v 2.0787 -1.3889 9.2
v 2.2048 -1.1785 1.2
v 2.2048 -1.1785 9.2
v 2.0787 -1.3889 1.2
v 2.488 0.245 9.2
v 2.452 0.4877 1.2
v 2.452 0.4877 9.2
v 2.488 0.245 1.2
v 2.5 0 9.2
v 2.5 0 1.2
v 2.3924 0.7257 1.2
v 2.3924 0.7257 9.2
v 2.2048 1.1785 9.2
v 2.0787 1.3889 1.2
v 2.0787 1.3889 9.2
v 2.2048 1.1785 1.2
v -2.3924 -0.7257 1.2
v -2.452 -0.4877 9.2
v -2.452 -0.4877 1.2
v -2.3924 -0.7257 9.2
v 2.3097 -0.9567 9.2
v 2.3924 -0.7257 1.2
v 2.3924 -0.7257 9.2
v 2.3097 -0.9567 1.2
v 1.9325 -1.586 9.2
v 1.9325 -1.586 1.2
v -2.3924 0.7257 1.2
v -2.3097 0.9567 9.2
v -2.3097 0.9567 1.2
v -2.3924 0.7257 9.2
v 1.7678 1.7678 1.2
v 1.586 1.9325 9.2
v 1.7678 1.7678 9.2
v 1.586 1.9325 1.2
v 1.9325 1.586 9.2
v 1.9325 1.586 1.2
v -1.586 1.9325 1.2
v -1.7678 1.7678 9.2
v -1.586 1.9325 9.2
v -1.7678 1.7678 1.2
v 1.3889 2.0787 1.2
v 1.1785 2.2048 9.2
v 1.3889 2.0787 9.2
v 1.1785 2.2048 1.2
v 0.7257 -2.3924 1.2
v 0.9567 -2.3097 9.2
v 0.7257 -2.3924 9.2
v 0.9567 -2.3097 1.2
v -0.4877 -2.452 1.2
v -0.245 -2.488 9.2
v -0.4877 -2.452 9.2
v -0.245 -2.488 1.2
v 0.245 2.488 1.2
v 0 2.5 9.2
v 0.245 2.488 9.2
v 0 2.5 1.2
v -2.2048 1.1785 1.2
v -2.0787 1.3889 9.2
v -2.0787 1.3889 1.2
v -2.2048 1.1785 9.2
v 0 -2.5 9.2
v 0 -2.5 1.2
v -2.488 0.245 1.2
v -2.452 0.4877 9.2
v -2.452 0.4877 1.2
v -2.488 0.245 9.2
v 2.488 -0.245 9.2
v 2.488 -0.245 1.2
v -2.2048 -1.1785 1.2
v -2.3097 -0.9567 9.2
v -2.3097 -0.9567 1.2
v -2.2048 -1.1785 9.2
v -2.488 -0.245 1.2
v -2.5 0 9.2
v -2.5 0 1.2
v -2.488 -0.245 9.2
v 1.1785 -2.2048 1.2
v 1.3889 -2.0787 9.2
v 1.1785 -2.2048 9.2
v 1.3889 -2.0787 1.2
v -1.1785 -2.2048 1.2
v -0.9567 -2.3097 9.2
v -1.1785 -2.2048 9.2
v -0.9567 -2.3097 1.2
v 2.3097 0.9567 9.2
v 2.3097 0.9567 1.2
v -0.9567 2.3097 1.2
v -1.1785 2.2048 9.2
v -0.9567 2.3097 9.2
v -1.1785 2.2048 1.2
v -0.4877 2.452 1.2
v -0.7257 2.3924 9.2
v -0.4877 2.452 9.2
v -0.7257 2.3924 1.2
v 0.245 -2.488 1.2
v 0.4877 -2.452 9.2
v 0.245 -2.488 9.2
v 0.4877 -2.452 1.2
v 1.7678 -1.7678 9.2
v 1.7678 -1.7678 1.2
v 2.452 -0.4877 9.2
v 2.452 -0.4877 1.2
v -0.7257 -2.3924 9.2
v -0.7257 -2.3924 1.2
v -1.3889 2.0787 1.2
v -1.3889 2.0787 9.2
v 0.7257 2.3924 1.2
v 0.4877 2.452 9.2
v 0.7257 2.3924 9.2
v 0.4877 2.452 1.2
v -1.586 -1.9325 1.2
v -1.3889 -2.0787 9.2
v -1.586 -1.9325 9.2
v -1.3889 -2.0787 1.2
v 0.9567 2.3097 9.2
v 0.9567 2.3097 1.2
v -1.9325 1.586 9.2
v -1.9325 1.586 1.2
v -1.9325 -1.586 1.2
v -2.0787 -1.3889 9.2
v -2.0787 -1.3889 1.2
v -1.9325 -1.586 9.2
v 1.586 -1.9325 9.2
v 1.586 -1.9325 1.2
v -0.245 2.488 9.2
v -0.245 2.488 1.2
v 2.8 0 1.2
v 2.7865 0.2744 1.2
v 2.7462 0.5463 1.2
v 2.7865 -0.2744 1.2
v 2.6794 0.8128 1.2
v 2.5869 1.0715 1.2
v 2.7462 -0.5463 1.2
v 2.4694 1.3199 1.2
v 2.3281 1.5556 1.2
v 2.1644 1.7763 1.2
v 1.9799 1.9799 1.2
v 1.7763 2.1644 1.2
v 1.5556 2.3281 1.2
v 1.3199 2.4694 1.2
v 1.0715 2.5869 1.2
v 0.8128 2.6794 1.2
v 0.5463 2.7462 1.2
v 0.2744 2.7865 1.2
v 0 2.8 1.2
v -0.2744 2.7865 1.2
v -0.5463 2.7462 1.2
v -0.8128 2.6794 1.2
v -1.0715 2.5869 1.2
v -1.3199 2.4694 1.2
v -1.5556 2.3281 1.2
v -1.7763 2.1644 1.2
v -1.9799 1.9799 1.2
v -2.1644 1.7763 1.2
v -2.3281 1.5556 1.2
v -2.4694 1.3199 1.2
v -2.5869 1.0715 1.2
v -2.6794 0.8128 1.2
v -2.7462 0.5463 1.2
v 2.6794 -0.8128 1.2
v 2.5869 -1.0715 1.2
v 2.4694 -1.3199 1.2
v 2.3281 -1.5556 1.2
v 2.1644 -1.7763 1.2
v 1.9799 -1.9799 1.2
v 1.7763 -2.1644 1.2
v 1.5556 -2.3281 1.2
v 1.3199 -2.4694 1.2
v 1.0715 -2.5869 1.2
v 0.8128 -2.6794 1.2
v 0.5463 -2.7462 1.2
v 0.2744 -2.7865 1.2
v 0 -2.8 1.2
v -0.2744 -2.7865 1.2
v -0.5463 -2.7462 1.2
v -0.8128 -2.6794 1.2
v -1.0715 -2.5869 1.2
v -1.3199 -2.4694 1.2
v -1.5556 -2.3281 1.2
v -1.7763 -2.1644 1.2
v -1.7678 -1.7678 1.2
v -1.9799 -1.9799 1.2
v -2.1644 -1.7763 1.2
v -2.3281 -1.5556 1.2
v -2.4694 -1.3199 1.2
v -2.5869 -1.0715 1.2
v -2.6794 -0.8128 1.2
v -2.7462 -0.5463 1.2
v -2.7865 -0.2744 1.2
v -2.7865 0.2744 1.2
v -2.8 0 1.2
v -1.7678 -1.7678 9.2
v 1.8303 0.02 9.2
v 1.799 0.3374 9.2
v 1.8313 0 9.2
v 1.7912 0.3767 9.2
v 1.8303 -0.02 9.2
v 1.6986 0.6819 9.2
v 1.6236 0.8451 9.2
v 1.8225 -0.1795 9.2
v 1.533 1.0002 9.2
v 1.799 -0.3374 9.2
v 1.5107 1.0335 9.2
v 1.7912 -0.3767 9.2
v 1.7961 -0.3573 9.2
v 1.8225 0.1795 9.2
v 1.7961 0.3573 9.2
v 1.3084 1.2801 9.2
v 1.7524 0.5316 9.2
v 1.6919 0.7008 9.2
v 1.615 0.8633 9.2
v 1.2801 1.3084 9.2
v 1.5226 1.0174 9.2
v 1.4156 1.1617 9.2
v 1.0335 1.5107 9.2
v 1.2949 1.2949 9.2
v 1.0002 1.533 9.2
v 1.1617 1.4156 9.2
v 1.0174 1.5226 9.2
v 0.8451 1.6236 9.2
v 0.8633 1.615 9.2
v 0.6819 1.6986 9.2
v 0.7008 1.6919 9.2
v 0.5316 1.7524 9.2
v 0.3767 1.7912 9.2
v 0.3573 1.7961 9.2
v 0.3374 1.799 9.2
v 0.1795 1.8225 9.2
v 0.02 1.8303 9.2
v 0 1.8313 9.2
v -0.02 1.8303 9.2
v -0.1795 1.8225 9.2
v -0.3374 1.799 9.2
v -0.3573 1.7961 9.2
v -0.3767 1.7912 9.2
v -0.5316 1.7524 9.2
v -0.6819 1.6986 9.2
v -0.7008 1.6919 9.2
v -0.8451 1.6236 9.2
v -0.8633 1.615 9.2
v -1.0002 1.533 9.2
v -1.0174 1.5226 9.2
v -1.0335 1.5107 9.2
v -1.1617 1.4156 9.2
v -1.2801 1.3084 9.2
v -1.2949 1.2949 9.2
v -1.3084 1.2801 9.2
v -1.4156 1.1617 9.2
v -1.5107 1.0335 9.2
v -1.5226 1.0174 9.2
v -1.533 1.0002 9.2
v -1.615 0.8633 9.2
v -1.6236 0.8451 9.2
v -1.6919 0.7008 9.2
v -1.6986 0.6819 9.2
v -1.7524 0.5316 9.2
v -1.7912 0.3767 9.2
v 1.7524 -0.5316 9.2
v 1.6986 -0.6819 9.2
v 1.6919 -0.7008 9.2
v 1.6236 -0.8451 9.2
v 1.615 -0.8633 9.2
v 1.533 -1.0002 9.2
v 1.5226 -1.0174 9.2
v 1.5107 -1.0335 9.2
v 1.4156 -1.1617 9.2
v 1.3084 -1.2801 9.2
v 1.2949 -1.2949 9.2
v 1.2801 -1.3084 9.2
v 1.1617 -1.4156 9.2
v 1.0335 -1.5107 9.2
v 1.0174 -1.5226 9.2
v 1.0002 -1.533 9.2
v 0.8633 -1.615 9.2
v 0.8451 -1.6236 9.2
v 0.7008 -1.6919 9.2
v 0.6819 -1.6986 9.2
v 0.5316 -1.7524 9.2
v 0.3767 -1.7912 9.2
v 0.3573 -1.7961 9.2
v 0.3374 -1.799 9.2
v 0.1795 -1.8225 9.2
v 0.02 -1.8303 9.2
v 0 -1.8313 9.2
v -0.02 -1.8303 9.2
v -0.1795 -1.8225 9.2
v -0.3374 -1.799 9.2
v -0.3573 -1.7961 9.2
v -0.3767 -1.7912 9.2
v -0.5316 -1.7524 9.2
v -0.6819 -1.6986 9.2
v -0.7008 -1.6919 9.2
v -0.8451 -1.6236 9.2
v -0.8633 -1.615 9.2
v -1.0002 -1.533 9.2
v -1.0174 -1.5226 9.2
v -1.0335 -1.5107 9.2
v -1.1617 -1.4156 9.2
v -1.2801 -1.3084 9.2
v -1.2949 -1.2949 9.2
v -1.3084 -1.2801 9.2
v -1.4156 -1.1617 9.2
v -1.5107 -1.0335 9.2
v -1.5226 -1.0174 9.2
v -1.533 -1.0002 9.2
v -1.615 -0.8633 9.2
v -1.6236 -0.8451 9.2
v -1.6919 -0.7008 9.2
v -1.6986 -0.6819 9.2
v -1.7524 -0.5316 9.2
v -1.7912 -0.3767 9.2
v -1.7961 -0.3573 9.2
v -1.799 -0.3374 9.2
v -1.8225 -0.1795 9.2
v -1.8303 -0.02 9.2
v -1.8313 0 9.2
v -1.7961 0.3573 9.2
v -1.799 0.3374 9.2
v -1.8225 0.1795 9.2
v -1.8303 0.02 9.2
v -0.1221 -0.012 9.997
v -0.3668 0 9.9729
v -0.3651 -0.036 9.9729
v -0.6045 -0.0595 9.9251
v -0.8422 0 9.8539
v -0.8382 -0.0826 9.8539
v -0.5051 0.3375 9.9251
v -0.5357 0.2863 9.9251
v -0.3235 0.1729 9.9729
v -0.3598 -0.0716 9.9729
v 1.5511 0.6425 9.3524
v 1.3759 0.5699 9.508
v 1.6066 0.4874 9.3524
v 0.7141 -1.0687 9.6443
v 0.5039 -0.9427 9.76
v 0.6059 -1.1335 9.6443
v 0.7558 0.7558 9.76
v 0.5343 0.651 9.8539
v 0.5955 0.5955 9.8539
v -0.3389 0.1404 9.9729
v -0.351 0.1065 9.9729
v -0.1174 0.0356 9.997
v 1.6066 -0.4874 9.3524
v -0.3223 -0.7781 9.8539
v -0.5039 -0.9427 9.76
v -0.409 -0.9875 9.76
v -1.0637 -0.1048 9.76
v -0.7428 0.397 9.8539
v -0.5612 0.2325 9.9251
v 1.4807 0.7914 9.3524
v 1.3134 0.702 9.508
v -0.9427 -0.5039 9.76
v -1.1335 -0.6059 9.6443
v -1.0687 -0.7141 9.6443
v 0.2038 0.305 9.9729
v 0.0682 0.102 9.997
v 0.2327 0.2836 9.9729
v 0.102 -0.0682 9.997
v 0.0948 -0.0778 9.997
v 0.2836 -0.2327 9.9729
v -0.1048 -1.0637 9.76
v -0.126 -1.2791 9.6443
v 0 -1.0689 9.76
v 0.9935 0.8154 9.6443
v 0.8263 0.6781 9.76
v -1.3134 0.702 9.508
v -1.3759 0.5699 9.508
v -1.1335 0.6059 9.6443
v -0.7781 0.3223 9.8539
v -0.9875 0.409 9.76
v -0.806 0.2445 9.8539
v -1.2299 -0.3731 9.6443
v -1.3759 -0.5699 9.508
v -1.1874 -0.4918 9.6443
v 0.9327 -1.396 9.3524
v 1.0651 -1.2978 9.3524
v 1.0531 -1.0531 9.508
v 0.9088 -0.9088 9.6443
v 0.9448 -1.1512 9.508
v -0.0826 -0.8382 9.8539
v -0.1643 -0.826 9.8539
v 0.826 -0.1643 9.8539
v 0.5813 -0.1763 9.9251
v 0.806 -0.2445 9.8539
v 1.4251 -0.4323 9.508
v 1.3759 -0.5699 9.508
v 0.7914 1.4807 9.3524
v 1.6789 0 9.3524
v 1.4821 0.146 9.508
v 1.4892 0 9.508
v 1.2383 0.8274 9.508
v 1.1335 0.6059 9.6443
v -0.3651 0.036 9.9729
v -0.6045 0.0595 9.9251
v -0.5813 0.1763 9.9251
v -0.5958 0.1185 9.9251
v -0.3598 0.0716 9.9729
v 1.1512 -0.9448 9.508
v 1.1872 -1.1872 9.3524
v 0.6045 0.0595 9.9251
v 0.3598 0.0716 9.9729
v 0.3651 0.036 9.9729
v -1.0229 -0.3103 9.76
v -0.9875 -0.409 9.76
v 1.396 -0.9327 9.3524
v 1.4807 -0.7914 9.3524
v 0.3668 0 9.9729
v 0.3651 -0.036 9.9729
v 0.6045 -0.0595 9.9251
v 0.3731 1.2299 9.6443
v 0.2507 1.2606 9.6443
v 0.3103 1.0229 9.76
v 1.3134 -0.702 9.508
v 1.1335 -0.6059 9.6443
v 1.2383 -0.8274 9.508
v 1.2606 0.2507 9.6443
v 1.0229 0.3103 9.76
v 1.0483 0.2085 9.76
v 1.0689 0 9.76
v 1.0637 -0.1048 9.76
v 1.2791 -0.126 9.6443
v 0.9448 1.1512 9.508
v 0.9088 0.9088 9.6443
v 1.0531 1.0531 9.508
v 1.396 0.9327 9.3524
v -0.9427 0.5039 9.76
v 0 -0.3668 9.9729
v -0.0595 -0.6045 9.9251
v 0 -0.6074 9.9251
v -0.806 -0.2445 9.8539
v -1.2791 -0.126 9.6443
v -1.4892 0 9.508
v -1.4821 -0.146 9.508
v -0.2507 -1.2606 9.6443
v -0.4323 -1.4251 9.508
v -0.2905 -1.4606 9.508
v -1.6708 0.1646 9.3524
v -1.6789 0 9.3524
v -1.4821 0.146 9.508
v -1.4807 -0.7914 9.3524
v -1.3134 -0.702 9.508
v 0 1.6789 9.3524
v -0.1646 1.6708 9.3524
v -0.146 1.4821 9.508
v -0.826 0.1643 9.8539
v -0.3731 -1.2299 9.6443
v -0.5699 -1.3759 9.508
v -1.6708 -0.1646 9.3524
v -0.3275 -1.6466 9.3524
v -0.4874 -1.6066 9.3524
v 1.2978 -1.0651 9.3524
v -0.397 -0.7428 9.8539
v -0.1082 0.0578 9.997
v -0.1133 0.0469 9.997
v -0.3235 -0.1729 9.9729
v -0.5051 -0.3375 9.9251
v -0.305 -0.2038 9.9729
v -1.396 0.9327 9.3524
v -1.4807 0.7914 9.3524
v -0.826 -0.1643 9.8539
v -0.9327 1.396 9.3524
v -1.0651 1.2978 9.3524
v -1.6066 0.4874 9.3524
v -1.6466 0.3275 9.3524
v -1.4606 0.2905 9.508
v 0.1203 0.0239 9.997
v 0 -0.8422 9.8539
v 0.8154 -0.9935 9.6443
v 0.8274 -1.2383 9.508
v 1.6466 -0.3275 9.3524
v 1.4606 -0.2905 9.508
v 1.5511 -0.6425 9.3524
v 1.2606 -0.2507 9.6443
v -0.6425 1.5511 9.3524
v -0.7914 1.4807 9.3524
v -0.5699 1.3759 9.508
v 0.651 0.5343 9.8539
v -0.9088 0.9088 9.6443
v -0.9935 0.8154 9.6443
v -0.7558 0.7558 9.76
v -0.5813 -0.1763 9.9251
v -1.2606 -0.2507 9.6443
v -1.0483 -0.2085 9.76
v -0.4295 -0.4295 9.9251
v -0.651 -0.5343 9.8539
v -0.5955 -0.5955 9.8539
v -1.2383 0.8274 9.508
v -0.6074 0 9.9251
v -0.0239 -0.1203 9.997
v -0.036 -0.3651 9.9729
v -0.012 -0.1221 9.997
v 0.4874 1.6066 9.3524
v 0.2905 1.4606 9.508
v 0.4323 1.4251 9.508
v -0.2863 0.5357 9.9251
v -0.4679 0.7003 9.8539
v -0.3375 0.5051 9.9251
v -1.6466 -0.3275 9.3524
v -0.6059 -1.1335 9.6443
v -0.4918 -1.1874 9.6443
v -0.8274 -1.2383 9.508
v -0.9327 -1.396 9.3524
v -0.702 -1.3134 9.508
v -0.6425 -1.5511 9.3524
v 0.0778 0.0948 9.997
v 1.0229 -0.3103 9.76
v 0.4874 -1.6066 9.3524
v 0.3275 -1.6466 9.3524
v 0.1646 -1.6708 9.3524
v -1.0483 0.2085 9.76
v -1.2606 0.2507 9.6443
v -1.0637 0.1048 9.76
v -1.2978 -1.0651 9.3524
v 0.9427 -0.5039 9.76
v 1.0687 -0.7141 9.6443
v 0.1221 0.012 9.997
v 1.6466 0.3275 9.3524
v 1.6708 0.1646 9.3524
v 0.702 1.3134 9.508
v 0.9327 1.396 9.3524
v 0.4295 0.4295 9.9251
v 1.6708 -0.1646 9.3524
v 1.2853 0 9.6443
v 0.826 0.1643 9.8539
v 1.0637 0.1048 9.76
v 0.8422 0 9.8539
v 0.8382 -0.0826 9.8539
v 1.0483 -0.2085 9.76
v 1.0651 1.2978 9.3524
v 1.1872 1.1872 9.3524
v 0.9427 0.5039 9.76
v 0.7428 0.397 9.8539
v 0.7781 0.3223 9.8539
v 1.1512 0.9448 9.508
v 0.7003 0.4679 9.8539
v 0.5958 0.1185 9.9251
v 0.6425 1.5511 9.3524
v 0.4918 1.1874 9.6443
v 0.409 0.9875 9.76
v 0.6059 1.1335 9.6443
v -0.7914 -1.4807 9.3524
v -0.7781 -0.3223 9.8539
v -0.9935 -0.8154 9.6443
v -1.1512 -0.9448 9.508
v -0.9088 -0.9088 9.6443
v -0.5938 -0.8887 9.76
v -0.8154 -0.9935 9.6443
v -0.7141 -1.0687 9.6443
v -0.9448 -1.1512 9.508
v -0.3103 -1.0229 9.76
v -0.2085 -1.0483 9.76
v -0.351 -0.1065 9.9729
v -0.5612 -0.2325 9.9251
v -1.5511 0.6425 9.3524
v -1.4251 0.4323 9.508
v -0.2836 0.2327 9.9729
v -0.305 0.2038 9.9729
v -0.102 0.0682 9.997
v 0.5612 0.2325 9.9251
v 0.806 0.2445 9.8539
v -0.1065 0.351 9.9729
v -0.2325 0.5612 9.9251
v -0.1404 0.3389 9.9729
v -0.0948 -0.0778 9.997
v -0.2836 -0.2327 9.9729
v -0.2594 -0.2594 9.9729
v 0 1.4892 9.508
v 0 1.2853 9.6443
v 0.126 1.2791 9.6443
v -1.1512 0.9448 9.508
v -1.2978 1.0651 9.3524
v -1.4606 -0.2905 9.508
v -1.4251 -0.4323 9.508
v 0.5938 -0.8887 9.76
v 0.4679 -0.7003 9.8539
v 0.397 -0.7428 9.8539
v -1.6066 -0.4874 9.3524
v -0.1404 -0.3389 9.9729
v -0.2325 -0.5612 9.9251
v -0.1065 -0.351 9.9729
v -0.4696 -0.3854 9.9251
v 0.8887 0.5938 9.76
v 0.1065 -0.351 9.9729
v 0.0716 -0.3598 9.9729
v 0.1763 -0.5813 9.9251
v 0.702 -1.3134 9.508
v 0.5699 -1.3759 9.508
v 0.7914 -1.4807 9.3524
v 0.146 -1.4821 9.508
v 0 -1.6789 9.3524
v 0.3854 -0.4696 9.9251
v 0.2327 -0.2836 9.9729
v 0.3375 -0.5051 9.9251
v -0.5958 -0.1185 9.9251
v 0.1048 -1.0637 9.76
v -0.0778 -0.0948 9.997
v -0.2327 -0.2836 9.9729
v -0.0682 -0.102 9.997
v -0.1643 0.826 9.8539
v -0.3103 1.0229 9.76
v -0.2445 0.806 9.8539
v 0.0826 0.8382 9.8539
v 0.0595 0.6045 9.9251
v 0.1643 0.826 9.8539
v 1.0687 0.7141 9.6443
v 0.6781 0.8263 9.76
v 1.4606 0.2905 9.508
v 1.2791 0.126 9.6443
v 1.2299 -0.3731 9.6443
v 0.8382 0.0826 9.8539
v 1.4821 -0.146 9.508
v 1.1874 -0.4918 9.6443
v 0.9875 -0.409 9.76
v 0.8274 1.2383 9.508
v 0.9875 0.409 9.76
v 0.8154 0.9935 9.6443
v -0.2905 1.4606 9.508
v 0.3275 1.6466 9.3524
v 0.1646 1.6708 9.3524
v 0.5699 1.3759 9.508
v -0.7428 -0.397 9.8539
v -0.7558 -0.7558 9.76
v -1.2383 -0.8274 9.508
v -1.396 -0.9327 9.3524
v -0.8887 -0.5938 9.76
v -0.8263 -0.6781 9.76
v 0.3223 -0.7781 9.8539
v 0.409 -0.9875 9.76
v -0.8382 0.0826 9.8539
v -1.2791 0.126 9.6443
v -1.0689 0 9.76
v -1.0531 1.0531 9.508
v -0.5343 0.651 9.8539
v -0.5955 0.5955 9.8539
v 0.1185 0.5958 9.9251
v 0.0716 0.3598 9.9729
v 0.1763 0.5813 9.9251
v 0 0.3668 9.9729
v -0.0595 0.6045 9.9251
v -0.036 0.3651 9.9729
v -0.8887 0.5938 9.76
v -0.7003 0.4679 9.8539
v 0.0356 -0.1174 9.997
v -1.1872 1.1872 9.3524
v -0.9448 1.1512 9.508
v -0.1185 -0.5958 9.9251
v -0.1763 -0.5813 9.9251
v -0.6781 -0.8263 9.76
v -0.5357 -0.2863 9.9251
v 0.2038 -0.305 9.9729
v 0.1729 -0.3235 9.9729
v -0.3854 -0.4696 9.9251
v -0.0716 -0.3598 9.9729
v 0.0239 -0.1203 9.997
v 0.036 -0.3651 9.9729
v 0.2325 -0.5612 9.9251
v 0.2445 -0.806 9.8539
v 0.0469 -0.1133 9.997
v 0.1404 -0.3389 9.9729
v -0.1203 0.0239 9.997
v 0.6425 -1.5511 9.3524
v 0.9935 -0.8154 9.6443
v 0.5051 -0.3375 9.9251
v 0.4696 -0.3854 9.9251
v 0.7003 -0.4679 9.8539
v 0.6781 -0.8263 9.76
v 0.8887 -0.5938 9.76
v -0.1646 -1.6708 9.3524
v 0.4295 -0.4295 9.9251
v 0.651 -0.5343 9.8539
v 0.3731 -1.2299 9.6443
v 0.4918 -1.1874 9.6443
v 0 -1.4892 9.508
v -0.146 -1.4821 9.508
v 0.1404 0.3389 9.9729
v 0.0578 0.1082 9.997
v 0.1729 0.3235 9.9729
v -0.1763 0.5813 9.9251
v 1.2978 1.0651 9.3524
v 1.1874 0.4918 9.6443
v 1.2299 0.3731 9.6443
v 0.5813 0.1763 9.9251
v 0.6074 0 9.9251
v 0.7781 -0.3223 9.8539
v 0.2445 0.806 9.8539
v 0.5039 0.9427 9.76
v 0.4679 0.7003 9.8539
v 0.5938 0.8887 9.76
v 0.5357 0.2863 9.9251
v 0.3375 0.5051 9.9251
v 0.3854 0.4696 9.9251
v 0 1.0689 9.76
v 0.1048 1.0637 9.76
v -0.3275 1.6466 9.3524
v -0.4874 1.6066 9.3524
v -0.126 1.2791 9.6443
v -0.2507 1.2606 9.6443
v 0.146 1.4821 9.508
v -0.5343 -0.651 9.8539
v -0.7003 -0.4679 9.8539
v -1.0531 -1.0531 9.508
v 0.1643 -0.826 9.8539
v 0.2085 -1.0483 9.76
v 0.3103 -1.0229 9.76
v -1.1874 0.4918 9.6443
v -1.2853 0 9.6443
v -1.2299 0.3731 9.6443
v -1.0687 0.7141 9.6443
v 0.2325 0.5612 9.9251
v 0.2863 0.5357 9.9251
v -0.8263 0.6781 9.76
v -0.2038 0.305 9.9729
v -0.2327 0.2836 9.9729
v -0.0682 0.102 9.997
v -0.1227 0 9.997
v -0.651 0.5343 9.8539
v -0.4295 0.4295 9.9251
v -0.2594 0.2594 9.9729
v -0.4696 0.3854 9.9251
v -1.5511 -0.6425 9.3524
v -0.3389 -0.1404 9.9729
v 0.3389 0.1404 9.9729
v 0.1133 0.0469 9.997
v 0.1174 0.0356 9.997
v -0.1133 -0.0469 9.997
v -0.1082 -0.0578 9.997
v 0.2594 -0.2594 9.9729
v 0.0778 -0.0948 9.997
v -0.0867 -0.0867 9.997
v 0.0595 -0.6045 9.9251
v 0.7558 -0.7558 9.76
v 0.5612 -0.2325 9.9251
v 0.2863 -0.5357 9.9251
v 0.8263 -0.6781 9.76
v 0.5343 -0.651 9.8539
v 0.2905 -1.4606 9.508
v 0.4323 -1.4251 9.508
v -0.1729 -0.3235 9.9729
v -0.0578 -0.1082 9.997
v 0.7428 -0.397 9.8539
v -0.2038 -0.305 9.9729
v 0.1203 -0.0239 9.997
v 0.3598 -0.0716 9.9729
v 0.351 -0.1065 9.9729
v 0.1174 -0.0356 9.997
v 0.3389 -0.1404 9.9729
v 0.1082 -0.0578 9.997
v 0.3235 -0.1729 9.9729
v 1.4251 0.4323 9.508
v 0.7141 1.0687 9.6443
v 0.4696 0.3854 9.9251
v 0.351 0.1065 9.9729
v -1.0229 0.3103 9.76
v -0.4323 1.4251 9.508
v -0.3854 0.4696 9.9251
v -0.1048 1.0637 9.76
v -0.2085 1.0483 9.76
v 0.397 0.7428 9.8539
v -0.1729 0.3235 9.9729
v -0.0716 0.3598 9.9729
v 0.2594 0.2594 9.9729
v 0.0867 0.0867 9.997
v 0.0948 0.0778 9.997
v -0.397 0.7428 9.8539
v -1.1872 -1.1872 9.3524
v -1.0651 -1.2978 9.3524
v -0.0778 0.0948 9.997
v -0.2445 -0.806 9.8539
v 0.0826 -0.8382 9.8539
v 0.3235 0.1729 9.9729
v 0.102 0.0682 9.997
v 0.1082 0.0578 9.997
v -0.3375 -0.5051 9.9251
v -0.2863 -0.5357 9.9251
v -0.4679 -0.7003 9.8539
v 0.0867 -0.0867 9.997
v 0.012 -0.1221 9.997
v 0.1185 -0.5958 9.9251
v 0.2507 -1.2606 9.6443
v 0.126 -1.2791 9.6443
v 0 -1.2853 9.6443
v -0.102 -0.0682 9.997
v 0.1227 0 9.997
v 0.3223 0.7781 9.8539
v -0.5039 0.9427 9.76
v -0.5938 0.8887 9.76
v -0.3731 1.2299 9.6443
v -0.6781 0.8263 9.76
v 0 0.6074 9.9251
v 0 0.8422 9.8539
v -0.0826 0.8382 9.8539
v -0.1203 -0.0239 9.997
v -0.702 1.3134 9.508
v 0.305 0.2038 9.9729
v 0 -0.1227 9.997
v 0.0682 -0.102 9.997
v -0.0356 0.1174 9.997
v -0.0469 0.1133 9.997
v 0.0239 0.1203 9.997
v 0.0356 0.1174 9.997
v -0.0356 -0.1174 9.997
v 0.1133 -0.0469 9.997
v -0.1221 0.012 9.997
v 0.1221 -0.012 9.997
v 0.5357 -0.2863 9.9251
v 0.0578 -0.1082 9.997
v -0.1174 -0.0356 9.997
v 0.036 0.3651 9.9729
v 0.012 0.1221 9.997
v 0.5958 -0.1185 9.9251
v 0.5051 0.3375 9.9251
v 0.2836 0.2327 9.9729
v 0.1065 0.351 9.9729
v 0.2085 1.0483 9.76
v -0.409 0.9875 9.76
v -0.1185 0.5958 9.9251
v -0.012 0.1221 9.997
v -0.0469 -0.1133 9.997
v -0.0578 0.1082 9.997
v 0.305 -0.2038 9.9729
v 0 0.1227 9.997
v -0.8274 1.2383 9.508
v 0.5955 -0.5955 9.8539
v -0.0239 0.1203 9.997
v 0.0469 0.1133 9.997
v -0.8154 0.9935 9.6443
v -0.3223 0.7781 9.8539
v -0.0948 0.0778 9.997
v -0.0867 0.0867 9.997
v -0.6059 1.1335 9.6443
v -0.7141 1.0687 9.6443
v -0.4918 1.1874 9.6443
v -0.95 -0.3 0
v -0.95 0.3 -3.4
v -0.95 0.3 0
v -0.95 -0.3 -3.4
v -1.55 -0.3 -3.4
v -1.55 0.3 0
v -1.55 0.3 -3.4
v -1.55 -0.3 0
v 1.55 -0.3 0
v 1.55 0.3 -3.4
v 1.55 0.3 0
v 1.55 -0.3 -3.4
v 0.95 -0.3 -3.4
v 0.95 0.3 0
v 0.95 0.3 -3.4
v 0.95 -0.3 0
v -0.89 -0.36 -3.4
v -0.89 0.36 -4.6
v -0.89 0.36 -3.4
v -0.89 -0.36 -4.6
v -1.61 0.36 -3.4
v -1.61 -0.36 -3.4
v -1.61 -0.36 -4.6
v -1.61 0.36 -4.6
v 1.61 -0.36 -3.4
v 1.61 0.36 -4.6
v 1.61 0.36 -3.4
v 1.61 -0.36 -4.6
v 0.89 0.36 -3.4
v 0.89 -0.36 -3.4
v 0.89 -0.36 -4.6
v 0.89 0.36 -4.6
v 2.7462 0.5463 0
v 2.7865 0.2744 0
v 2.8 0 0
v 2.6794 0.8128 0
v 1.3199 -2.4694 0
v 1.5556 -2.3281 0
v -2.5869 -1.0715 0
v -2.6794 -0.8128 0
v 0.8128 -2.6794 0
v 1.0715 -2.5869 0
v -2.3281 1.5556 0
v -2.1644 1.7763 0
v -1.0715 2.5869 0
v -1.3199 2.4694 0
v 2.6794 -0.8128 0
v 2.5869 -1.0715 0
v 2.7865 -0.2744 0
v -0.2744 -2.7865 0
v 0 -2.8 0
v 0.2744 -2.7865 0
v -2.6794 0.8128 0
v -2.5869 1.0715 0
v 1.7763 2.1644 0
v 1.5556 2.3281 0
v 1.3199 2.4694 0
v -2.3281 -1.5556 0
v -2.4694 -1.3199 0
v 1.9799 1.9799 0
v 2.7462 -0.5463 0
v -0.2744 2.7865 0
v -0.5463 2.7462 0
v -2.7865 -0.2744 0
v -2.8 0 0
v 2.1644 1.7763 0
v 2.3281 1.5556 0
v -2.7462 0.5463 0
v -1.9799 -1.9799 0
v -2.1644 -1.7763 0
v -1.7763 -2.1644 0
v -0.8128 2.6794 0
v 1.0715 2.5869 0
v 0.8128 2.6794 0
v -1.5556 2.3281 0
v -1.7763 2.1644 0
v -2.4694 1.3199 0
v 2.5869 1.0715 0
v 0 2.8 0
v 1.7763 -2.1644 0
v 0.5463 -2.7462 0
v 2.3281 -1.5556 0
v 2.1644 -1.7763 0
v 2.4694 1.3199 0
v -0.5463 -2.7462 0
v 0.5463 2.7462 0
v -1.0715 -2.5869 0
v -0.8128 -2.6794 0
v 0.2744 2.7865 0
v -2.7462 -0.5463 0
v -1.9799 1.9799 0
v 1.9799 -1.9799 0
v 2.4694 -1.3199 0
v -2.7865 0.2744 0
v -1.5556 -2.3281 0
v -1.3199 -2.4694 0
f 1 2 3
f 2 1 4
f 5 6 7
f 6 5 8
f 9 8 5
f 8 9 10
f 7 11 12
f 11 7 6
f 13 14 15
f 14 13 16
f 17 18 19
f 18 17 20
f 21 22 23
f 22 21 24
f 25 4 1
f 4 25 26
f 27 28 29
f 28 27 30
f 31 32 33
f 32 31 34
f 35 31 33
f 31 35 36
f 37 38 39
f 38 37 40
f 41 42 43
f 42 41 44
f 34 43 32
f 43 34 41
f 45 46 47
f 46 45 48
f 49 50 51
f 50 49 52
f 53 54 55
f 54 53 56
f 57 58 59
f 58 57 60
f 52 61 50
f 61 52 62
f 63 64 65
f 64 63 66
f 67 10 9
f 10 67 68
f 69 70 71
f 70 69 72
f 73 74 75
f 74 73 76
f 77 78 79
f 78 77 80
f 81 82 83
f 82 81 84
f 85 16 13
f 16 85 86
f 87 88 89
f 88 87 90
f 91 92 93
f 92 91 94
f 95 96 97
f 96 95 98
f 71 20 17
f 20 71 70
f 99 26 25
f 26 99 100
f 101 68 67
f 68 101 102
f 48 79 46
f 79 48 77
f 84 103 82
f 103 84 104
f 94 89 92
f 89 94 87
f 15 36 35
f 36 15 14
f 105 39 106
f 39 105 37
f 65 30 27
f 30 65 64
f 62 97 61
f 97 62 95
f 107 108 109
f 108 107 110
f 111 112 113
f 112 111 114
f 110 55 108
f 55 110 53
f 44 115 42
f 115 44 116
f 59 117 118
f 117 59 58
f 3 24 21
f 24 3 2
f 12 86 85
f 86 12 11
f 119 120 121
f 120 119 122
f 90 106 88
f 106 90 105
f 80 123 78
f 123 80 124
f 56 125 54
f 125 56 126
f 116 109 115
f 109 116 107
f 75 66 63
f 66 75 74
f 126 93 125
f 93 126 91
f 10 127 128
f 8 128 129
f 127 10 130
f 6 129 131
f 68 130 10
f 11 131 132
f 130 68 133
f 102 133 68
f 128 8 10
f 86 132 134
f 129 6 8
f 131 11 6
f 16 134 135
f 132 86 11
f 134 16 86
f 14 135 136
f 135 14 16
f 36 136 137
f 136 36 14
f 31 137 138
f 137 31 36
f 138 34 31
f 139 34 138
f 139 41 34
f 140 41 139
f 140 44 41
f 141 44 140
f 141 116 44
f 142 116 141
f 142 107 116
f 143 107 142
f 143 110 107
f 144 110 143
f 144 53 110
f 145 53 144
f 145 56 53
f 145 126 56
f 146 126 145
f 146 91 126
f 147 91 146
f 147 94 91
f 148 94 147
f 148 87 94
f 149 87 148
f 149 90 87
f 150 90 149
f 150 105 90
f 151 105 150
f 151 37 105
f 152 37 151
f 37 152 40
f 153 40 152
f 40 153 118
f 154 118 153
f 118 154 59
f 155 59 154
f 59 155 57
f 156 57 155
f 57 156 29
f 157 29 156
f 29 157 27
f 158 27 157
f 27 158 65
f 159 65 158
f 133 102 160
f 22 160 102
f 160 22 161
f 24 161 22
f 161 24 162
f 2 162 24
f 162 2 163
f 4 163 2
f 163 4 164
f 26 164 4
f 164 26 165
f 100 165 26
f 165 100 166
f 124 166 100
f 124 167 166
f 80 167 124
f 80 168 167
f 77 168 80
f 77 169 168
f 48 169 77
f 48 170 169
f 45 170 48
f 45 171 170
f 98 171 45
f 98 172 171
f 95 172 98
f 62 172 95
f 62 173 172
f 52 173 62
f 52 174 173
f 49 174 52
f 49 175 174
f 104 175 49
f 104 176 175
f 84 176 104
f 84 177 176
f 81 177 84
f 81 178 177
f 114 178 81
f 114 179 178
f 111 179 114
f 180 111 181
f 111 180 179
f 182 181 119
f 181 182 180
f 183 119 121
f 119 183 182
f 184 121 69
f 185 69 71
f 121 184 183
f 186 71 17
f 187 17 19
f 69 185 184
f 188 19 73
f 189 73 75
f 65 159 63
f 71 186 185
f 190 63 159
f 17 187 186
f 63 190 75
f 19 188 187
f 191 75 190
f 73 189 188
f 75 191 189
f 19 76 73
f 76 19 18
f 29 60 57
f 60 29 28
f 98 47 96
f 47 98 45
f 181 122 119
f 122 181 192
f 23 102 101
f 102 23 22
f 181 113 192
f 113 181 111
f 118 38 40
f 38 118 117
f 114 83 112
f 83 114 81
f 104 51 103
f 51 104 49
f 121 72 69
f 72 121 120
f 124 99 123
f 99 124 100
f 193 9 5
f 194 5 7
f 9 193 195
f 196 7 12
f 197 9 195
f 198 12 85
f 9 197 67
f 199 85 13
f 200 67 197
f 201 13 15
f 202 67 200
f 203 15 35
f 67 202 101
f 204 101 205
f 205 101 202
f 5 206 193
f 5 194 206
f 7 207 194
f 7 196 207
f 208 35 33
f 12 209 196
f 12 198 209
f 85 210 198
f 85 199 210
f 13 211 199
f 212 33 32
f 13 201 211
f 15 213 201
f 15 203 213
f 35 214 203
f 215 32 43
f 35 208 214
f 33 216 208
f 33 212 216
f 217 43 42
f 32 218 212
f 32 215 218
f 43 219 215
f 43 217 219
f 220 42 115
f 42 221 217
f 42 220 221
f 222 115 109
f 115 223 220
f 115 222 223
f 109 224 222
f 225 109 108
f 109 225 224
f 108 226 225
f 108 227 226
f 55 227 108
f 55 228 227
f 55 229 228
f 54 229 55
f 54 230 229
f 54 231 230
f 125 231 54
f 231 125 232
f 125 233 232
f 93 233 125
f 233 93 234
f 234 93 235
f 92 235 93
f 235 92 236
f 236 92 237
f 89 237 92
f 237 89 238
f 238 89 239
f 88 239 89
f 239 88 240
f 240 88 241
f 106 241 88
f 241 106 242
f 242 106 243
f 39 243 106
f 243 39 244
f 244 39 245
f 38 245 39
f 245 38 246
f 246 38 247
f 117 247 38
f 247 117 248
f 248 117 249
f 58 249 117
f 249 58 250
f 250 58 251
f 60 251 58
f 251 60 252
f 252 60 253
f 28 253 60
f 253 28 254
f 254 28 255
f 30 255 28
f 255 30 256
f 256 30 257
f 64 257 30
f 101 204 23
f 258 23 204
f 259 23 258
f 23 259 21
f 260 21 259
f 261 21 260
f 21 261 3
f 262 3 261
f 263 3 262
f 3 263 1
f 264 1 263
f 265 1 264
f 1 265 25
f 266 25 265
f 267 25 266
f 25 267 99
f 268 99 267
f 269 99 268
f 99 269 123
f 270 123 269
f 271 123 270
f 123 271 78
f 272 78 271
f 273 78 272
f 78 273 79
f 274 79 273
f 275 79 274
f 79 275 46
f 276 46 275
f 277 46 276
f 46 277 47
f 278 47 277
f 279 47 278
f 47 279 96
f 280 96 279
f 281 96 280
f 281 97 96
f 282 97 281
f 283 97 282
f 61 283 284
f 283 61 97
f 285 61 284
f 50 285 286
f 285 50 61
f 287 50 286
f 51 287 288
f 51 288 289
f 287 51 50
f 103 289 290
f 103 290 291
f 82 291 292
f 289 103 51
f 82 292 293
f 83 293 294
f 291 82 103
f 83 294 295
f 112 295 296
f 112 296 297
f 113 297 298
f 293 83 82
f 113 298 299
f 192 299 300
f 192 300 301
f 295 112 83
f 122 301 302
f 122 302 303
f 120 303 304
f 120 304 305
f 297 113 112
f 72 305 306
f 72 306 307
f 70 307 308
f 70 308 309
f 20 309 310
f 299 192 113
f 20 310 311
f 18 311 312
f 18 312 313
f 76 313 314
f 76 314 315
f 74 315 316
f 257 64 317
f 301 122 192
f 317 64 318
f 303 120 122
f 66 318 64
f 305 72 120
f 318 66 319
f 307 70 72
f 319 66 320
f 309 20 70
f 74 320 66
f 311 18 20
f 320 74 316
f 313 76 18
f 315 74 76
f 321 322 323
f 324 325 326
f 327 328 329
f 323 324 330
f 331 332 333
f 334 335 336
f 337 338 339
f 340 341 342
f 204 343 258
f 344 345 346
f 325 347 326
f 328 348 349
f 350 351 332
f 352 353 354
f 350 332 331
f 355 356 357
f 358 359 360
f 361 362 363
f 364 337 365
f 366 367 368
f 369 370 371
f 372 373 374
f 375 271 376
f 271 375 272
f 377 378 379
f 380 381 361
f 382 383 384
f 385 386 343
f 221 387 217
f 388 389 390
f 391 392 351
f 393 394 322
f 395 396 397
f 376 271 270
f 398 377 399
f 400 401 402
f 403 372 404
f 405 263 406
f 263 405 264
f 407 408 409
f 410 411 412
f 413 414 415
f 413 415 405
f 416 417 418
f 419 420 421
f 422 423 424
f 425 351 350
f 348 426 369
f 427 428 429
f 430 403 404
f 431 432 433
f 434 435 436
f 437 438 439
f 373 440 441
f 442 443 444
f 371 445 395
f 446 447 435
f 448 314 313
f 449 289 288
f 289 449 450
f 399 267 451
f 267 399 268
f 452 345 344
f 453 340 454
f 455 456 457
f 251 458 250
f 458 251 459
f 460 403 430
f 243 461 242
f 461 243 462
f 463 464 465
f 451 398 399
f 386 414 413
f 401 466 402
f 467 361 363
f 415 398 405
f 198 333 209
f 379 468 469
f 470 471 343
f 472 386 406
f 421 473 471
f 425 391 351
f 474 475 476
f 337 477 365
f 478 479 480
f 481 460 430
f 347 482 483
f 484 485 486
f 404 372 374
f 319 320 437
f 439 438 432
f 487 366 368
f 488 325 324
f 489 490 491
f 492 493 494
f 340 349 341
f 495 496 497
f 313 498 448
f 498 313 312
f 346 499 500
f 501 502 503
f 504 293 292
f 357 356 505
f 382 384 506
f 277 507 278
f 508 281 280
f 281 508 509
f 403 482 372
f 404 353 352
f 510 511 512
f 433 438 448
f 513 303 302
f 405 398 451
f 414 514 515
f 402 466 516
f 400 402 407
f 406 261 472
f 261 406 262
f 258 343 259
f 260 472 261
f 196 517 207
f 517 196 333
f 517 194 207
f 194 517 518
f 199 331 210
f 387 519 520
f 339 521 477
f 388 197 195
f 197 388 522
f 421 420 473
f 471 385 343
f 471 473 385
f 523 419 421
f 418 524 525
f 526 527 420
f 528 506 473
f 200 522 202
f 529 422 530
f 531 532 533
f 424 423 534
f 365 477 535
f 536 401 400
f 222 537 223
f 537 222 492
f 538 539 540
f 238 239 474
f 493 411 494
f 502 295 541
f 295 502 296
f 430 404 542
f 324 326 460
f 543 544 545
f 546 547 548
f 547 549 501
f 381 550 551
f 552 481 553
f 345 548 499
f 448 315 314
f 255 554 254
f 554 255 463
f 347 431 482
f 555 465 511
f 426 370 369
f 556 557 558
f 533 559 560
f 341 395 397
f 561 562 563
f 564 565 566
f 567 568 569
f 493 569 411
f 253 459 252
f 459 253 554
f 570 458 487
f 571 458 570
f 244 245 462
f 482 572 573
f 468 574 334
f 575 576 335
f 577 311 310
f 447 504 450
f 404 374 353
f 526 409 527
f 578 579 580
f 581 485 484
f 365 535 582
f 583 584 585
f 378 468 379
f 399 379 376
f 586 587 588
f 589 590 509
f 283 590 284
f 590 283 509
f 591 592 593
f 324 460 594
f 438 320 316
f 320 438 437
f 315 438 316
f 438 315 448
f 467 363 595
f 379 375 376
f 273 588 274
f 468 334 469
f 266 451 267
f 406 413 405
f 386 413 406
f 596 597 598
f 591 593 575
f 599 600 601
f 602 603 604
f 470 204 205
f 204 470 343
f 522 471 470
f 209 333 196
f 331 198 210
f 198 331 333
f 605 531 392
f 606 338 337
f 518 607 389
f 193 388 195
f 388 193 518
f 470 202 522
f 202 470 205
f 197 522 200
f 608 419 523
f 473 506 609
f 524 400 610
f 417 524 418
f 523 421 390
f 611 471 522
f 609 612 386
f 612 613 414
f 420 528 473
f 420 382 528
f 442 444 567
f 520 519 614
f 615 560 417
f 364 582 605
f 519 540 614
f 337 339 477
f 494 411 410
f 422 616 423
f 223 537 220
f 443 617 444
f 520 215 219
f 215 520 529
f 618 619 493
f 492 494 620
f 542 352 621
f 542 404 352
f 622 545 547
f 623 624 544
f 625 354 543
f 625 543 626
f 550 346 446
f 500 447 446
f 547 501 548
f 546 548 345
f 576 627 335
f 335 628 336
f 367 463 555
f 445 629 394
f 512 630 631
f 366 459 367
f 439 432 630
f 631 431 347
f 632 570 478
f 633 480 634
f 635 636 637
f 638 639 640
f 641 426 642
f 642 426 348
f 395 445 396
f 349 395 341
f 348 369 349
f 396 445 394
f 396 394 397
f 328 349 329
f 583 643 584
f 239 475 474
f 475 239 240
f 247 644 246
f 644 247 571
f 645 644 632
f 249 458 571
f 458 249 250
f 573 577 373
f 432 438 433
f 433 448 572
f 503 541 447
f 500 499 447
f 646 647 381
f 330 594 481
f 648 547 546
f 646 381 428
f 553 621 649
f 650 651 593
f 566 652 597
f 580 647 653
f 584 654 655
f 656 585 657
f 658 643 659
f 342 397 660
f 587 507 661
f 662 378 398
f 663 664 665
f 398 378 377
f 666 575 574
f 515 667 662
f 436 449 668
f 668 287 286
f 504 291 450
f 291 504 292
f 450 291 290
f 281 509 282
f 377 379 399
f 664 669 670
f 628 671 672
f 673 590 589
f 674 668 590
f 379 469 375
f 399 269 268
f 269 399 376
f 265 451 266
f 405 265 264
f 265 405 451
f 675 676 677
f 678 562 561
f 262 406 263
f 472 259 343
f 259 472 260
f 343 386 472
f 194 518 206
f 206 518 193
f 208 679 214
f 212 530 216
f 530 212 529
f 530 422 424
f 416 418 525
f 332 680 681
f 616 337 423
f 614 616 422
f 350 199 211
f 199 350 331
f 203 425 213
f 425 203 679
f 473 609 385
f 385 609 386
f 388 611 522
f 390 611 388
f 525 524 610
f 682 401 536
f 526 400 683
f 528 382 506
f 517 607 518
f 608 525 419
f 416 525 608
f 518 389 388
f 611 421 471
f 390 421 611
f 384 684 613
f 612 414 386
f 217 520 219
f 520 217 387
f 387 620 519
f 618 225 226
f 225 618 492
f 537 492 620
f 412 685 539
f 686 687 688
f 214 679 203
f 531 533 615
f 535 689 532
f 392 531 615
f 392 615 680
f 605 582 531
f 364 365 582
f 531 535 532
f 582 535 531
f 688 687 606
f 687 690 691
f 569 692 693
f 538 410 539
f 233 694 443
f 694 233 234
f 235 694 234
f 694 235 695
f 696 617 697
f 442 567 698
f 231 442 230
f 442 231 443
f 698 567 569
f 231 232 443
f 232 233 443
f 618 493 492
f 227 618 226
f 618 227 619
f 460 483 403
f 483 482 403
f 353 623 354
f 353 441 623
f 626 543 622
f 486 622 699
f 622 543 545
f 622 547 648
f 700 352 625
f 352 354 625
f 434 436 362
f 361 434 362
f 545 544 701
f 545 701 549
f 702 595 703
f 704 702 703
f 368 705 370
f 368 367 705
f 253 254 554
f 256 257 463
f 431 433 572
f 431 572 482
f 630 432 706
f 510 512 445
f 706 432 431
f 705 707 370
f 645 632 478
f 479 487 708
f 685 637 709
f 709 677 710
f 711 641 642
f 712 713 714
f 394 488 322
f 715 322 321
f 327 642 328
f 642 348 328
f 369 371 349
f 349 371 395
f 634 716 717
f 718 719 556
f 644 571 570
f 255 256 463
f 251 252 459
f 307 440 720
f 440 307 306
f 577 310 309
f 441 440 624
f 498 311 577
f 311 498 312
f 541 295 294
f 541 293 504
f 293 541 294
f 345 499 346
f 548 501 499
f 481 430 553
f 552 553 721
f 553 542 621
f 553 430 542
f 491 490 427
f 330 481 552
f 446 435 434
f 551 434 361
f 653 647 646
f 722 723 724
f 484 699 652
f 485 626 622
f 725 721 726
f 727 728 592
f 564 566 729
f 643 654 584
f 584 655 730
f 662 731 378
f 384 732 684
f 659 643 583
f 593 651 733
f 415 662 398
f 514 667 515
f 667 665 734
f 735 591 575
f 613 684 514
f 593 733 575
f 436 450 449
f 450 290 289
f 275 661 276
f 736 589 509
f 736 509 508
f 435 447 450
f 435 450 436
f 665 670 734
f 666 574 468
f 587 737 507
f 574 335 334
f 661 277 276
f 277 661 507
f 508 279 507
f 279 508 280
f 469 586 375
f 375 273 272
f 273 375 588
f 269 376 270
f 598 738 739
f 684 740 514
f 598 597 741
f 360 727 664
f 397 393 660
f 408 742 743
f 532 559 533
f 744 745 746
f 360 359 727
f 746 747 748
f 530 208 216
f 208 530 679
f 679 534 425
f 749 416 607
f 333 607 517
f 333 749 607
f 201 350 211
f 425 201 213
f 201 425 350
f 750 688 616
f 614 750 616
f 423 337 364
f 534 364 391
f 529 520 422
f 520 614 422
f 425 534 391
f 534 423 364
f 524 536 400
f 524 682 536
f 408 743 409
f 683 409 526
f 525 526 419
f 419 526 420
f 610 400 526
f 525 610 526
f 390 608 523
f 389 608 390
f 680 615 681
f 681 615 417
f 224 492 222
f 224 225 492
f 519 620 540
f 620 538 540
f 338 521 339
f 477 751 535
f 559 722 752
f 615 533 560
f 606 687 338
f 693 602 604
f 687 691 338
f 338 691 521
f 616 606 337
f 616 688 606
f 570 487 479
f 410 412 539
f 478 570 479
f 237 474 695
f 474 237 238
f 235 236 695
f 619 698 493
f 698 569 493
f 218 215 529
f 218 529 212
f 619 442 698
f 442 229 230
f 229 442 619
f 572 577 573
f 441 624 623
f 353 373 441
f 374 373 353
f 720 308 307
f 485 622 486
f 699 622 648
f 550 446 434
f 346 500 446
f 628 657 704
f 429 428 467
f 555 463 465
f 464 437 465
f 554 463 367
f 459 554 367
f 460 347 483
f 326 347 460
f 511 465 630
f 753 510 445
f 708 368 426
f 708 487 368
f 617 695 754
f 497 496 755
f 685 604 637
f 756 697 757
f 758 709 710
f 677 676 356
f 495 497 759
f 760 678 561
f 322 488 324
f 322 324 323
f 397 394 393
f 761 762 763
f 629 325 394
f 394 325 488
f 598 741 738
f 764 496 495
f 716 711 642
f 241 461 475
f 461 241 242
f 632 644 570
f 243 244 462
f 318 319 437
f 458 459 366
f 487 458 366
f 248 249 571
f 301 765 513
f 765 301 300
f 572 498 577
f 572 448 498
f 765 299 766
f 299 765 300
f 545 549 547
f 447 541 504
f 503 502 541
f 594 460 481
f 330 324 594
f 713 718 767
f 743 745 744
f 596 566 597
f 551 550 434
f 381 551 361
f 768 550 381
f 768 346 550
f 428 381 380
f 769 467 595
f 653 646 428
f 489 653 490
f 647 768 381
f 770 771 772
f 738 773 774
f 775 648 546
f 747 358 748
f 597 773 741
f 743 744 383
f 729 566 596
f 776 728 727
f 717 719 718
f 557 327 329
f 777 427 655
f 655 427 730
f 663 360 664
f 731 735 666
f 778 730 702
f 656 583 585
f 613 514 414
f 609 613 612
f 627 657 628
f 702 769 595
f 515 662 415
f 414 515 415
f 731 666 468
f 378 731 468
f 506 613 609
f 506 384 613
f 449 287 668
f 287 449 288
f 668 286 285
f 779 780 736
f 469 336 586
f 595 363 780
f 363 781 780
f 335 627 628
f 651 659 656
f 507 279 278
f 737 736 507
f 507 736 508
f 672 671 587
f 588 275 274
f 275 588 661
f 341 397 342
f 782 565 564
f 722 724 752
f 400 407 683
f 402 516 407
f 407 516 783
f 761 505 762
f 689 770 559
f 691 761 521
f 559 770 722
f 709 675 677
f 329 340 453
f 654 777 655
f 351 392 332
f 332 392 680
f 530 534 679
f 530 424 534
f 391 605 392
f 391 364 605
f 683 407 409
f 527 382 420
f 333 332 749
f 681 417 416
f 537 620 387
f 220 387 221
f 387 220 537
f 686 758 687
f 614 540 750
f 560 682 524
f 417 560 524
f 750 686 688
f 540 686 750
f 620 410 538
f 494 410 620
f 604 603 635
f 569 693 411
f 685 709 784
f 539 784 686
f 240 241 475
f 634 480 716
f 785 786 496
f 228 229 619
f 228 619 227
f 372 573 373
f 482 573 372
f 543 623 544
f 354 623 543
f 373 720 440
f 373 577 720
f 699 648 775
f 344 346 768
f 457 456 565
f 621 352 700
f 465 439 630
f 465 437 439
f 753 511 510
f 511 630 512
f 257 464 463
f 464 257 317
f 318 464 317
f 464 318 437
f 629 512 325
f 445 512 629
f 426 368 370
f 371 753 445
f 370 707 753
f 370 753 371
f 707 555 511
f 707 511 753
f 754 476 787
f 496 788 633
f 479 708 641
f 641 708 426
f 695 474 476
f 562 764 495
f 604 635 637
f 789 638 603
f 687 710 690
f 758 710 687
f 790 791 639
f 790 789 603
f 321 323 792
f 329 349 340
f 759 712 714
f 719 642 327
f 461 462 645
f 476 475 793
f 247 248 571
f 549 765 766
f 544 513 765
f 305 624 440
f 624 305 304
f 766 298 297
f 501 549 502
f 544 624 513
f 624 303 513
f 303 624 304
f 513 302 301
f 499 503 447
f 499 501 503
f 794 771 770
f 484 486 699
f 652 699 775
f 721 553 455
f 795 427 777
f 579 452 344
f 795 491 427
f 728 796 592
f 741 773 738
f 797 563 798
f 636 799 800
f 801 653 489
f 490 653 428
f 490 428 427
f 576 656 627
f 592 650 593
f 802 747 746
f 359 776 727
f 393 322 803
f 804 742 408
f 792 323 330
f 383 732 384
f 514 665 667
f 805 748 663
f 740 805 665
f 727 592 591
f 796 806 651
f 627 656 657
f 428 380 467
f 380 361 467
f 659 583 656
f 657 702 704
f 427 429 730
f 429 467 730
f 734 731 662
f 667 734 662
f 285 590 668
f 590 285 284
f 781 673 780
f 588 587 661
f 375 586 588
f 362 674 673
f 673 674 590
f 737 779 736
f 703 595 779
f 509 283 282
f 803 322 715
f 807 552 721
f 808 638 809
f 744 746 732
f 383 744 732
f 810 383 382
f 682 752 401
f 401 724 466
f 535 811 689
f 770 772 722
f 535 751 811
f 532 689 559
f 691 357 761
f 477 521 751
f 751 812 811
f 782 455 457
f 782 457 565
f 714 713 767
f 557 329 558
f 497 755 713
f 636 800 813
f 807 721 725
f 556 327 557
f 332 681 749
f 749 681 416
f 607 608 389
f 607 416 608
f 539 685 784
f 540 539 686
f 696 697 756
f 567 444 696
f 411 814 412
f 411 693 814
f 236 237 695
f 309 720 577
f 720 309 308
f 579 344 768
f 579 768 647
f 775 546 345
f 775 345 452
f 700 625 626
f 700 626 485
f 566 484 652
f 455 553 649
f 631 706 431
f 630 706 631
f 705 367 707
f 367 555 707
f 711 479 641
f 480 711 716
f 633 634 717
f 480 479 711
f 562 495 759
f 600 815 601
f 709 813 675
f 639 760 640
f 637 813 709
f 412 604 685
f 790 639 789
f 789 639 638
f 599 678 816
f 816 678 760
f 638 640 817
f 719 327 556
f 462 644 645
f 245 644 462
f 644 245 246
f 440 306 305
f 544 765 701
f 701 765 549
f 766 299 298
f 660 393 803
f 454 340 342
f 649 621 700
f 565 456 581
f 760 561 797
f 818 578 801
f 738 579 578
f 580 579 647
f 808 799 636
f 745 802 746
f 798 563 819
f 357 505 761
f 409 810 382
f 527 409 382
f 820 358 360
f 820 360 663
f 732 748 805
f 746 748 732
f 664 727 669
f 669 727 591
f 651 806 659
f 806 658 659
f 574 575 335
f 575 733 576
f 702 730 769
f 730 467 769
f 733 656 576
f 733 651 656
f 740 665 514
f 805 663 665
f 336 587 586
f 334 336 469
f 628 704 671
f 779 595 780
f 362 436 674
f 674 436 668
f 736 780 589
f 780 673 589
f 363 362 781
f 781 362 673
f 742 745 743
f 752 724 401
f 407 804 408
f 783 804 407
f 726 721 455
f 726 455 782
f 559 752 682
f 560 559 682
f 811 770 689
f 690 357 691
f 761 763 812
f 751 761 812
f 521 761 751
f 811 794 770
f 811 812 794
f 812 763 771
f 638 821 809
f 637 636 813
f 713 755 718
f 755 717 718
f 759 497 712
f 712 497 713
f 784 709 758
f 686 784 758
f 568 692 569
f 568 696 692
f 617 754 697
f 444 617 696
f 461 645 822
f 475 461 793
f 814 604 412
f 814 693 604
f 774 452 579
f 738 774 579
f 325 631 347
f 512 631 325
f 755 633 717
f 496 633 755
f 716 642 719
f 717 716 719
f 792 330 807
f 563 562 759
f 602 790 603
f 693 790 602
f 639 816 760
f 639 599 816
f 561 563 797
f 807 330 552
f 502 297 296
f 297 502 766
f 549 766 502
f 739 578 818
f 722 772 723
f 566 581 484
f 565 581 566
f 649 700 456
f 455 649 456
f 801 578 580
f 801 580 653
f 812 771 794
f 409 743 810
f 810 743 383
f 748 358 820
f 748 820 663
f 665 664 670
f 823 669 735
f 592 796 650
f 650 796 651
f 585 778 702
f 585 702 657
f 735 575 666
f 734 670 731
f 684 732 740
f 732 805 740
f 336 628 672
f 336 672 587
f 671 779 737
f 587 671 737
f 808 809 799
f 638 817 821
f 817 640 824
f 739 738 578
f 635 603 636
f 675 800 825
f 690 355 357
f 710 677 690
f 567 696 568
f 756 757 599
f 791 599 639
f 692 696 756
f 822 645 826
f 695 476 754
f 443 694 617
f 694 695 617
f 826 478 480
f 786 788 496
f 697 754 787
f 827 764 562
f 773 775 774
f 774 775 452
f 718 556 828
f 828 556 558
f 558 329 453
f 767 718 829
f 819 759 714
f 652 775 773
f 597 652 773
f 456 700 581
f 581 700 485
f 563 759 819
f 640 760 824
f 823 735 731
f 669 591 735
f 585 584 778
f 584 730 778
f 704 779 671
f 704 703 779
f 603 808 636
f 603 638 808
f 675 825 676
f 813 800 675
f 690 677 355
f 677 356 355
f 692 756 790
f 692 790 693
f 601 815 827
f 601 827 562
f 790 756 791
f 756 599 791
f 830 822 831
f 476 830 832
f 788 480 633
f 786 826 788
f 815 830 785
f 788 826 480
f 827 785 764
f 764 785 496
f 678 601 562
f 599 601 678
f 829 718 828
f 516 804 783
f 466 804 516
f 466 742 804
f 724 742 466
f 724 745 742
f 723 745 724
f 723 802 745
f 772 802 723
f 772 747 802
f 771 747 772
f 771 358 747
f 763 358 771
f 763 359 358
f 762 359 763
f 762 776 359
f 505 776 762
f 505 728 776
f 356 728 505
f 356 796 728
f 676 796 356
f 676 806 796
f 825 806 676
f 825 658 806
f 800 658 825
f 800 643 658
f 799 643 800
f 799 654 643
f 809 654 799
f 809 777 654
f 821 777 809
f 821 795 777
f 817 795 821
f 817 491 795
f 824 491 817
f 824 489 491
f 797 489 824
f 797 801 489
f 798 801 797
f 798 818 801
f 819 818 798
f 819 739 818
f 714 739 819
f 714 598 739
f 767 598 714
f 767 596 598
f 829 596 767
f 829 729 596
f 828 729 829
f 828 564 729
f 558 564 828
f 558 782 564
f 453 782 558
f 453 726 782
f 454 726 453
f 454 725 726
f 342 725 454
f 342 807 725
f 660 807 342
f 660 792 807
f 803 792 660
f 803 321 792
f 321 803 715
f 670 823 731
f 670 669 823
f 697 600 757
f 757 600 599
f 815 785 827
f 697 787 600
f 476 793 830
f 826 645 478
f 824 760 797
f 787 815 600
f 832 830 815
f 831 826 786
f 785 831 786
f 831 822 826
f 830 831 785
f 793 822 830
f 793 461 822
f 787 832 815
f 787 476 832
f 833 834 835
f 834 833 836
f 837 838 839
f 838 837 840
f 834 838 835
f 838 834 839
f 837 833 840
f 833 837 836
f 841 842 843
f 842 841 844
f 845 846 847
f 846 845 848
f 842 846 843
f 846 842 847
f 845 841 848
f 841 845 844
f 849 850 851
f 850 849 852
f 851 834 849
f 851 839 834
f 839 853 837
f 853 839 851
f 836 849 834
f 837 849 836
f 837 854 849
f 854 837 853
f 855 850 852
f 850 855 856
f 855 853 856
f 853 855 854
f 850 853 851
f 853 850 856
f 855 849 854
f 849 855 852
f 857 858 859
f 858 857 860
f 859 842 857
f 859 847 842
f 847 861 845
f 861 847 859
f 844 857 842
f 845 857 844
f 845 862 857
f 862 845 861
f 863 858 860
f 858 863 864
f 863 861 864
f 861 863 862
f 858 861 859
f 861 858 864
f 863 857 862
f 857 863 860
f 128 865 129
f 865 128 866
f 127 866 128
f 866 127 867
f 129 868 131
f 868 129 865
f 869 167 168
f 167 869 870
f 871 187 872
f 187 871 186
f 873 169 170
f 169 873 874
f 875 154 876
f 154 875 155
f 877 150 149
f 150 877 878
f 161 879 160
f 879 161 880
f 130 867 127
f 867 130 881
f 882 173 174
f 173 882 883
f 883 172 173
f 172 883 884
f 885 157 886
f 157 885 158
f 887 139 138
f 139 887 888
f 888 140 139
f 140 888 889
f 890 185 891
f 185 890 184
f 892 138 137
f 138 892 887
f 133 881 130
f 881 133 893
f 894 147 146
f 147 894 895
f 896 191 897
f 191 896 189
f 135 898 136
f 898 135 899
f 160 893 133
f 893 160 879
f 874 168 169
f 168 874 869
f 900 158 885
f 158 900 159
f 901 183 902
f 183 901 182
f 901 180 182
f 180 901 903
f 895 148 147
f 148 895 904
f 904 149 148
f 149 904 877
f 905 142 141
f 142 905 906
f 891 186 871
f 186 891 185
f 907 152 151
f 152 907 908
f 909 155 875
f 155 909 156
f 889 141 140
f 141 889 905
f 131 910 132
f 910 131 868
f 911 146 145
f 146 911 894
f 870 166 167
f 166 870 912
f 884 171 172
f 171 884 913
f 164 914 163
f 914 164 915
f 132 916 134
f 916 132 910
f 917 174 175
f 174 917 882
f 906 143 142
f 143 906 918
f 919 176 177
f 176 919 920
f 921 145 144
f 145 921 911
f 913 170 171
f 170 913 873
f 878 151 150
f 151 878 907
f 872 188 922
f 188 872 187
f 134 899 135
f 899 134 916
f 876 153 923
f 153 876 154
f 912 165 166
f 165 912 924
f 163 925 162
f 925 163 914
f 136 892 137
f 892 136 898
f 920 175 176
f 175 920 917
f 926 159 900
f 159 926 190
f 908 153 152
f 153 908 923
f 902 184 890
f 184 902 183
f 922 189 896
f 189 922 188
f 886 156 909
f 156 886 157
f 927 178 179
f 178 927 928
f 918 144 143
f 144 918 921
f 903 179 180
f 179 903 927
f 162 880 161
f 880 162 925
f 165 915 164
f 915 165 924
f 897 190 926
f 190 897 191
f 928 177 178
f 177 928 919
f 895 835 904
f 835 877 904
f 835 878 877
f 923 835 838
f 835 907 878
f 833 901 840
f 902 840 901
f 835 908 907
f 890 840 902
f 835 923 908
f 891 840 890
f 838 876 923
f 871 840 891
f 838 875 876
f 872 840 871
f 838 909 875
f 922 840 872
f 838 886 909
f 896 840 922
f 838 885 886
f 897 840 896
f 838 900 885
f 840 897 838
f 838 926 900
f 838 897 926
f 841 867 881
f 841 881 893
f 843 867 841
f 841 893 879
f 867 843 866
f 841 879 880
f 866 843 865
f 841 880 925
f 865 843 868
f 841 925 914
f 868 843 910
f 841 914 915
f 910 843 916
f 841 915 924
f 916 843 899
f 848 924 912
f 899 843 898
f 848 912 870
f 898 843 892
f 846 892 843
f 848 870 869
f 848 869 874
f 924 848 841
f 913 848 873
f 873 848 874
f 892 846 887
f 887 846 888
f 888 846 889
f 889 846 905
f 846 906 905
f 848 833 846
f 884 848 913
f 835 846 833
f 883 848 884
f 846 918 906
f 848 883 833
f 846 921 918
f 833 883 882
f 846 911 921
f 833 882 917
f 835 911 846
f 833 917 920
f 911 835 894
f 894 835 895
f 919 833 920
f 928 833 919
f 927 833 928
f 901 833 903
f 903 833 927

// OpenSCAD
// Parameters
led_type = 5; //[3:10:1]
lead = 5; //[3:15:1]
right_angle = 0; //[0:12:1]
eps = 0.8; //[0.2:2:0.1]
body_height = 8; //[5:16:1]
rim_thickness = 1.2; //[0.6:2.4:0.1]
rim_diameter_factor = 1.12; //[1.05:1.3:0.01]
lead_thickness = 0.6; //[0.3:1.2:0.1]
lead_pitch_factor = 0.5; //[0.35:0.7:0.01]
solder_end_length = 1.2; //[0.6:3:0.1]
bend_radius_factor = 1.2; //[0.8:2.0:0.1]

$fn = 64;

// Derived dimensions
body_r = led_type/2;
rim_r  = (led_type * rim_diameter_factor)/2;

lead_pitch = led_type * lead_pitch_factor;
lead_xL = -lead_pitch/2;
lead_xR =  lead_pitch/2;

// Keep everything in +Z so it doesn't get clipped by view/camera setups.
// Rim bottom at z=0, leads go downward from rim.
z_rim_center  = rim_thickness/2;
z_body_center = rim_thickness + body_height/2;

// Leads: top slightly overlaps into rim (at z=0..rim_thickness)
z_lead_center = -lead/2 + eps; // lead top at z=eps (overlaps into rim)

// Solder ends: overlap into lead bottoms
z_solder_center = (z_lead_center - lead/2) - solder_end_length/2 + eps;

// LED Body (cylinder + dome), connected to rim by overlap
module led_body() {
  union() {
    translate([0, 0, z_body_center])
      cylinder(r=body_r, h=body_height, center=true);

    // Dome: center at top of cylinder, overlaps by eps
    translate([0, 0, rim_thickness + body_height - body_r + eps])
      sphere(r=body_r);
  }
}

// LED Rim (flange), overlaps into body slightly
module led_rim() {
  translate([0, 0, z_rim_center])
    cylinder(r=rim_r, h=rim_thickness, center=true);
}

// LED Leads (rectangular pins), overlap into rim
module led_leads() {
  union() {
    translate([lead_xL, 0, z_lead_center])
      cube([lead_thickness, lead_thickness, lead], center=true);

    translate([lead_xR, 0, z_lead_center])
      cube([lead_thickness, lead_thickness, lead], center=true);
  }
}

// Solder Ends (thicker tips), overlap into lead bottoms
module solder_ends() {
  tip = lead_thickness * 1.2;
  union() {
    translate([lead_xL, 0, z_solder_center])
      cube([tip, tip, solder_end_length], center=true);

    translate([lead_xR, 0, z_solder_center])
      cube([tip, tip, solder_end_length], center=true);
  }
}

// LED Assembly - ONE connected solid (all parts overlap)
module led() {
  union() {
    led_rim();
    led_body();
    led_leads();
    solder_ends();
  }
}

led();
